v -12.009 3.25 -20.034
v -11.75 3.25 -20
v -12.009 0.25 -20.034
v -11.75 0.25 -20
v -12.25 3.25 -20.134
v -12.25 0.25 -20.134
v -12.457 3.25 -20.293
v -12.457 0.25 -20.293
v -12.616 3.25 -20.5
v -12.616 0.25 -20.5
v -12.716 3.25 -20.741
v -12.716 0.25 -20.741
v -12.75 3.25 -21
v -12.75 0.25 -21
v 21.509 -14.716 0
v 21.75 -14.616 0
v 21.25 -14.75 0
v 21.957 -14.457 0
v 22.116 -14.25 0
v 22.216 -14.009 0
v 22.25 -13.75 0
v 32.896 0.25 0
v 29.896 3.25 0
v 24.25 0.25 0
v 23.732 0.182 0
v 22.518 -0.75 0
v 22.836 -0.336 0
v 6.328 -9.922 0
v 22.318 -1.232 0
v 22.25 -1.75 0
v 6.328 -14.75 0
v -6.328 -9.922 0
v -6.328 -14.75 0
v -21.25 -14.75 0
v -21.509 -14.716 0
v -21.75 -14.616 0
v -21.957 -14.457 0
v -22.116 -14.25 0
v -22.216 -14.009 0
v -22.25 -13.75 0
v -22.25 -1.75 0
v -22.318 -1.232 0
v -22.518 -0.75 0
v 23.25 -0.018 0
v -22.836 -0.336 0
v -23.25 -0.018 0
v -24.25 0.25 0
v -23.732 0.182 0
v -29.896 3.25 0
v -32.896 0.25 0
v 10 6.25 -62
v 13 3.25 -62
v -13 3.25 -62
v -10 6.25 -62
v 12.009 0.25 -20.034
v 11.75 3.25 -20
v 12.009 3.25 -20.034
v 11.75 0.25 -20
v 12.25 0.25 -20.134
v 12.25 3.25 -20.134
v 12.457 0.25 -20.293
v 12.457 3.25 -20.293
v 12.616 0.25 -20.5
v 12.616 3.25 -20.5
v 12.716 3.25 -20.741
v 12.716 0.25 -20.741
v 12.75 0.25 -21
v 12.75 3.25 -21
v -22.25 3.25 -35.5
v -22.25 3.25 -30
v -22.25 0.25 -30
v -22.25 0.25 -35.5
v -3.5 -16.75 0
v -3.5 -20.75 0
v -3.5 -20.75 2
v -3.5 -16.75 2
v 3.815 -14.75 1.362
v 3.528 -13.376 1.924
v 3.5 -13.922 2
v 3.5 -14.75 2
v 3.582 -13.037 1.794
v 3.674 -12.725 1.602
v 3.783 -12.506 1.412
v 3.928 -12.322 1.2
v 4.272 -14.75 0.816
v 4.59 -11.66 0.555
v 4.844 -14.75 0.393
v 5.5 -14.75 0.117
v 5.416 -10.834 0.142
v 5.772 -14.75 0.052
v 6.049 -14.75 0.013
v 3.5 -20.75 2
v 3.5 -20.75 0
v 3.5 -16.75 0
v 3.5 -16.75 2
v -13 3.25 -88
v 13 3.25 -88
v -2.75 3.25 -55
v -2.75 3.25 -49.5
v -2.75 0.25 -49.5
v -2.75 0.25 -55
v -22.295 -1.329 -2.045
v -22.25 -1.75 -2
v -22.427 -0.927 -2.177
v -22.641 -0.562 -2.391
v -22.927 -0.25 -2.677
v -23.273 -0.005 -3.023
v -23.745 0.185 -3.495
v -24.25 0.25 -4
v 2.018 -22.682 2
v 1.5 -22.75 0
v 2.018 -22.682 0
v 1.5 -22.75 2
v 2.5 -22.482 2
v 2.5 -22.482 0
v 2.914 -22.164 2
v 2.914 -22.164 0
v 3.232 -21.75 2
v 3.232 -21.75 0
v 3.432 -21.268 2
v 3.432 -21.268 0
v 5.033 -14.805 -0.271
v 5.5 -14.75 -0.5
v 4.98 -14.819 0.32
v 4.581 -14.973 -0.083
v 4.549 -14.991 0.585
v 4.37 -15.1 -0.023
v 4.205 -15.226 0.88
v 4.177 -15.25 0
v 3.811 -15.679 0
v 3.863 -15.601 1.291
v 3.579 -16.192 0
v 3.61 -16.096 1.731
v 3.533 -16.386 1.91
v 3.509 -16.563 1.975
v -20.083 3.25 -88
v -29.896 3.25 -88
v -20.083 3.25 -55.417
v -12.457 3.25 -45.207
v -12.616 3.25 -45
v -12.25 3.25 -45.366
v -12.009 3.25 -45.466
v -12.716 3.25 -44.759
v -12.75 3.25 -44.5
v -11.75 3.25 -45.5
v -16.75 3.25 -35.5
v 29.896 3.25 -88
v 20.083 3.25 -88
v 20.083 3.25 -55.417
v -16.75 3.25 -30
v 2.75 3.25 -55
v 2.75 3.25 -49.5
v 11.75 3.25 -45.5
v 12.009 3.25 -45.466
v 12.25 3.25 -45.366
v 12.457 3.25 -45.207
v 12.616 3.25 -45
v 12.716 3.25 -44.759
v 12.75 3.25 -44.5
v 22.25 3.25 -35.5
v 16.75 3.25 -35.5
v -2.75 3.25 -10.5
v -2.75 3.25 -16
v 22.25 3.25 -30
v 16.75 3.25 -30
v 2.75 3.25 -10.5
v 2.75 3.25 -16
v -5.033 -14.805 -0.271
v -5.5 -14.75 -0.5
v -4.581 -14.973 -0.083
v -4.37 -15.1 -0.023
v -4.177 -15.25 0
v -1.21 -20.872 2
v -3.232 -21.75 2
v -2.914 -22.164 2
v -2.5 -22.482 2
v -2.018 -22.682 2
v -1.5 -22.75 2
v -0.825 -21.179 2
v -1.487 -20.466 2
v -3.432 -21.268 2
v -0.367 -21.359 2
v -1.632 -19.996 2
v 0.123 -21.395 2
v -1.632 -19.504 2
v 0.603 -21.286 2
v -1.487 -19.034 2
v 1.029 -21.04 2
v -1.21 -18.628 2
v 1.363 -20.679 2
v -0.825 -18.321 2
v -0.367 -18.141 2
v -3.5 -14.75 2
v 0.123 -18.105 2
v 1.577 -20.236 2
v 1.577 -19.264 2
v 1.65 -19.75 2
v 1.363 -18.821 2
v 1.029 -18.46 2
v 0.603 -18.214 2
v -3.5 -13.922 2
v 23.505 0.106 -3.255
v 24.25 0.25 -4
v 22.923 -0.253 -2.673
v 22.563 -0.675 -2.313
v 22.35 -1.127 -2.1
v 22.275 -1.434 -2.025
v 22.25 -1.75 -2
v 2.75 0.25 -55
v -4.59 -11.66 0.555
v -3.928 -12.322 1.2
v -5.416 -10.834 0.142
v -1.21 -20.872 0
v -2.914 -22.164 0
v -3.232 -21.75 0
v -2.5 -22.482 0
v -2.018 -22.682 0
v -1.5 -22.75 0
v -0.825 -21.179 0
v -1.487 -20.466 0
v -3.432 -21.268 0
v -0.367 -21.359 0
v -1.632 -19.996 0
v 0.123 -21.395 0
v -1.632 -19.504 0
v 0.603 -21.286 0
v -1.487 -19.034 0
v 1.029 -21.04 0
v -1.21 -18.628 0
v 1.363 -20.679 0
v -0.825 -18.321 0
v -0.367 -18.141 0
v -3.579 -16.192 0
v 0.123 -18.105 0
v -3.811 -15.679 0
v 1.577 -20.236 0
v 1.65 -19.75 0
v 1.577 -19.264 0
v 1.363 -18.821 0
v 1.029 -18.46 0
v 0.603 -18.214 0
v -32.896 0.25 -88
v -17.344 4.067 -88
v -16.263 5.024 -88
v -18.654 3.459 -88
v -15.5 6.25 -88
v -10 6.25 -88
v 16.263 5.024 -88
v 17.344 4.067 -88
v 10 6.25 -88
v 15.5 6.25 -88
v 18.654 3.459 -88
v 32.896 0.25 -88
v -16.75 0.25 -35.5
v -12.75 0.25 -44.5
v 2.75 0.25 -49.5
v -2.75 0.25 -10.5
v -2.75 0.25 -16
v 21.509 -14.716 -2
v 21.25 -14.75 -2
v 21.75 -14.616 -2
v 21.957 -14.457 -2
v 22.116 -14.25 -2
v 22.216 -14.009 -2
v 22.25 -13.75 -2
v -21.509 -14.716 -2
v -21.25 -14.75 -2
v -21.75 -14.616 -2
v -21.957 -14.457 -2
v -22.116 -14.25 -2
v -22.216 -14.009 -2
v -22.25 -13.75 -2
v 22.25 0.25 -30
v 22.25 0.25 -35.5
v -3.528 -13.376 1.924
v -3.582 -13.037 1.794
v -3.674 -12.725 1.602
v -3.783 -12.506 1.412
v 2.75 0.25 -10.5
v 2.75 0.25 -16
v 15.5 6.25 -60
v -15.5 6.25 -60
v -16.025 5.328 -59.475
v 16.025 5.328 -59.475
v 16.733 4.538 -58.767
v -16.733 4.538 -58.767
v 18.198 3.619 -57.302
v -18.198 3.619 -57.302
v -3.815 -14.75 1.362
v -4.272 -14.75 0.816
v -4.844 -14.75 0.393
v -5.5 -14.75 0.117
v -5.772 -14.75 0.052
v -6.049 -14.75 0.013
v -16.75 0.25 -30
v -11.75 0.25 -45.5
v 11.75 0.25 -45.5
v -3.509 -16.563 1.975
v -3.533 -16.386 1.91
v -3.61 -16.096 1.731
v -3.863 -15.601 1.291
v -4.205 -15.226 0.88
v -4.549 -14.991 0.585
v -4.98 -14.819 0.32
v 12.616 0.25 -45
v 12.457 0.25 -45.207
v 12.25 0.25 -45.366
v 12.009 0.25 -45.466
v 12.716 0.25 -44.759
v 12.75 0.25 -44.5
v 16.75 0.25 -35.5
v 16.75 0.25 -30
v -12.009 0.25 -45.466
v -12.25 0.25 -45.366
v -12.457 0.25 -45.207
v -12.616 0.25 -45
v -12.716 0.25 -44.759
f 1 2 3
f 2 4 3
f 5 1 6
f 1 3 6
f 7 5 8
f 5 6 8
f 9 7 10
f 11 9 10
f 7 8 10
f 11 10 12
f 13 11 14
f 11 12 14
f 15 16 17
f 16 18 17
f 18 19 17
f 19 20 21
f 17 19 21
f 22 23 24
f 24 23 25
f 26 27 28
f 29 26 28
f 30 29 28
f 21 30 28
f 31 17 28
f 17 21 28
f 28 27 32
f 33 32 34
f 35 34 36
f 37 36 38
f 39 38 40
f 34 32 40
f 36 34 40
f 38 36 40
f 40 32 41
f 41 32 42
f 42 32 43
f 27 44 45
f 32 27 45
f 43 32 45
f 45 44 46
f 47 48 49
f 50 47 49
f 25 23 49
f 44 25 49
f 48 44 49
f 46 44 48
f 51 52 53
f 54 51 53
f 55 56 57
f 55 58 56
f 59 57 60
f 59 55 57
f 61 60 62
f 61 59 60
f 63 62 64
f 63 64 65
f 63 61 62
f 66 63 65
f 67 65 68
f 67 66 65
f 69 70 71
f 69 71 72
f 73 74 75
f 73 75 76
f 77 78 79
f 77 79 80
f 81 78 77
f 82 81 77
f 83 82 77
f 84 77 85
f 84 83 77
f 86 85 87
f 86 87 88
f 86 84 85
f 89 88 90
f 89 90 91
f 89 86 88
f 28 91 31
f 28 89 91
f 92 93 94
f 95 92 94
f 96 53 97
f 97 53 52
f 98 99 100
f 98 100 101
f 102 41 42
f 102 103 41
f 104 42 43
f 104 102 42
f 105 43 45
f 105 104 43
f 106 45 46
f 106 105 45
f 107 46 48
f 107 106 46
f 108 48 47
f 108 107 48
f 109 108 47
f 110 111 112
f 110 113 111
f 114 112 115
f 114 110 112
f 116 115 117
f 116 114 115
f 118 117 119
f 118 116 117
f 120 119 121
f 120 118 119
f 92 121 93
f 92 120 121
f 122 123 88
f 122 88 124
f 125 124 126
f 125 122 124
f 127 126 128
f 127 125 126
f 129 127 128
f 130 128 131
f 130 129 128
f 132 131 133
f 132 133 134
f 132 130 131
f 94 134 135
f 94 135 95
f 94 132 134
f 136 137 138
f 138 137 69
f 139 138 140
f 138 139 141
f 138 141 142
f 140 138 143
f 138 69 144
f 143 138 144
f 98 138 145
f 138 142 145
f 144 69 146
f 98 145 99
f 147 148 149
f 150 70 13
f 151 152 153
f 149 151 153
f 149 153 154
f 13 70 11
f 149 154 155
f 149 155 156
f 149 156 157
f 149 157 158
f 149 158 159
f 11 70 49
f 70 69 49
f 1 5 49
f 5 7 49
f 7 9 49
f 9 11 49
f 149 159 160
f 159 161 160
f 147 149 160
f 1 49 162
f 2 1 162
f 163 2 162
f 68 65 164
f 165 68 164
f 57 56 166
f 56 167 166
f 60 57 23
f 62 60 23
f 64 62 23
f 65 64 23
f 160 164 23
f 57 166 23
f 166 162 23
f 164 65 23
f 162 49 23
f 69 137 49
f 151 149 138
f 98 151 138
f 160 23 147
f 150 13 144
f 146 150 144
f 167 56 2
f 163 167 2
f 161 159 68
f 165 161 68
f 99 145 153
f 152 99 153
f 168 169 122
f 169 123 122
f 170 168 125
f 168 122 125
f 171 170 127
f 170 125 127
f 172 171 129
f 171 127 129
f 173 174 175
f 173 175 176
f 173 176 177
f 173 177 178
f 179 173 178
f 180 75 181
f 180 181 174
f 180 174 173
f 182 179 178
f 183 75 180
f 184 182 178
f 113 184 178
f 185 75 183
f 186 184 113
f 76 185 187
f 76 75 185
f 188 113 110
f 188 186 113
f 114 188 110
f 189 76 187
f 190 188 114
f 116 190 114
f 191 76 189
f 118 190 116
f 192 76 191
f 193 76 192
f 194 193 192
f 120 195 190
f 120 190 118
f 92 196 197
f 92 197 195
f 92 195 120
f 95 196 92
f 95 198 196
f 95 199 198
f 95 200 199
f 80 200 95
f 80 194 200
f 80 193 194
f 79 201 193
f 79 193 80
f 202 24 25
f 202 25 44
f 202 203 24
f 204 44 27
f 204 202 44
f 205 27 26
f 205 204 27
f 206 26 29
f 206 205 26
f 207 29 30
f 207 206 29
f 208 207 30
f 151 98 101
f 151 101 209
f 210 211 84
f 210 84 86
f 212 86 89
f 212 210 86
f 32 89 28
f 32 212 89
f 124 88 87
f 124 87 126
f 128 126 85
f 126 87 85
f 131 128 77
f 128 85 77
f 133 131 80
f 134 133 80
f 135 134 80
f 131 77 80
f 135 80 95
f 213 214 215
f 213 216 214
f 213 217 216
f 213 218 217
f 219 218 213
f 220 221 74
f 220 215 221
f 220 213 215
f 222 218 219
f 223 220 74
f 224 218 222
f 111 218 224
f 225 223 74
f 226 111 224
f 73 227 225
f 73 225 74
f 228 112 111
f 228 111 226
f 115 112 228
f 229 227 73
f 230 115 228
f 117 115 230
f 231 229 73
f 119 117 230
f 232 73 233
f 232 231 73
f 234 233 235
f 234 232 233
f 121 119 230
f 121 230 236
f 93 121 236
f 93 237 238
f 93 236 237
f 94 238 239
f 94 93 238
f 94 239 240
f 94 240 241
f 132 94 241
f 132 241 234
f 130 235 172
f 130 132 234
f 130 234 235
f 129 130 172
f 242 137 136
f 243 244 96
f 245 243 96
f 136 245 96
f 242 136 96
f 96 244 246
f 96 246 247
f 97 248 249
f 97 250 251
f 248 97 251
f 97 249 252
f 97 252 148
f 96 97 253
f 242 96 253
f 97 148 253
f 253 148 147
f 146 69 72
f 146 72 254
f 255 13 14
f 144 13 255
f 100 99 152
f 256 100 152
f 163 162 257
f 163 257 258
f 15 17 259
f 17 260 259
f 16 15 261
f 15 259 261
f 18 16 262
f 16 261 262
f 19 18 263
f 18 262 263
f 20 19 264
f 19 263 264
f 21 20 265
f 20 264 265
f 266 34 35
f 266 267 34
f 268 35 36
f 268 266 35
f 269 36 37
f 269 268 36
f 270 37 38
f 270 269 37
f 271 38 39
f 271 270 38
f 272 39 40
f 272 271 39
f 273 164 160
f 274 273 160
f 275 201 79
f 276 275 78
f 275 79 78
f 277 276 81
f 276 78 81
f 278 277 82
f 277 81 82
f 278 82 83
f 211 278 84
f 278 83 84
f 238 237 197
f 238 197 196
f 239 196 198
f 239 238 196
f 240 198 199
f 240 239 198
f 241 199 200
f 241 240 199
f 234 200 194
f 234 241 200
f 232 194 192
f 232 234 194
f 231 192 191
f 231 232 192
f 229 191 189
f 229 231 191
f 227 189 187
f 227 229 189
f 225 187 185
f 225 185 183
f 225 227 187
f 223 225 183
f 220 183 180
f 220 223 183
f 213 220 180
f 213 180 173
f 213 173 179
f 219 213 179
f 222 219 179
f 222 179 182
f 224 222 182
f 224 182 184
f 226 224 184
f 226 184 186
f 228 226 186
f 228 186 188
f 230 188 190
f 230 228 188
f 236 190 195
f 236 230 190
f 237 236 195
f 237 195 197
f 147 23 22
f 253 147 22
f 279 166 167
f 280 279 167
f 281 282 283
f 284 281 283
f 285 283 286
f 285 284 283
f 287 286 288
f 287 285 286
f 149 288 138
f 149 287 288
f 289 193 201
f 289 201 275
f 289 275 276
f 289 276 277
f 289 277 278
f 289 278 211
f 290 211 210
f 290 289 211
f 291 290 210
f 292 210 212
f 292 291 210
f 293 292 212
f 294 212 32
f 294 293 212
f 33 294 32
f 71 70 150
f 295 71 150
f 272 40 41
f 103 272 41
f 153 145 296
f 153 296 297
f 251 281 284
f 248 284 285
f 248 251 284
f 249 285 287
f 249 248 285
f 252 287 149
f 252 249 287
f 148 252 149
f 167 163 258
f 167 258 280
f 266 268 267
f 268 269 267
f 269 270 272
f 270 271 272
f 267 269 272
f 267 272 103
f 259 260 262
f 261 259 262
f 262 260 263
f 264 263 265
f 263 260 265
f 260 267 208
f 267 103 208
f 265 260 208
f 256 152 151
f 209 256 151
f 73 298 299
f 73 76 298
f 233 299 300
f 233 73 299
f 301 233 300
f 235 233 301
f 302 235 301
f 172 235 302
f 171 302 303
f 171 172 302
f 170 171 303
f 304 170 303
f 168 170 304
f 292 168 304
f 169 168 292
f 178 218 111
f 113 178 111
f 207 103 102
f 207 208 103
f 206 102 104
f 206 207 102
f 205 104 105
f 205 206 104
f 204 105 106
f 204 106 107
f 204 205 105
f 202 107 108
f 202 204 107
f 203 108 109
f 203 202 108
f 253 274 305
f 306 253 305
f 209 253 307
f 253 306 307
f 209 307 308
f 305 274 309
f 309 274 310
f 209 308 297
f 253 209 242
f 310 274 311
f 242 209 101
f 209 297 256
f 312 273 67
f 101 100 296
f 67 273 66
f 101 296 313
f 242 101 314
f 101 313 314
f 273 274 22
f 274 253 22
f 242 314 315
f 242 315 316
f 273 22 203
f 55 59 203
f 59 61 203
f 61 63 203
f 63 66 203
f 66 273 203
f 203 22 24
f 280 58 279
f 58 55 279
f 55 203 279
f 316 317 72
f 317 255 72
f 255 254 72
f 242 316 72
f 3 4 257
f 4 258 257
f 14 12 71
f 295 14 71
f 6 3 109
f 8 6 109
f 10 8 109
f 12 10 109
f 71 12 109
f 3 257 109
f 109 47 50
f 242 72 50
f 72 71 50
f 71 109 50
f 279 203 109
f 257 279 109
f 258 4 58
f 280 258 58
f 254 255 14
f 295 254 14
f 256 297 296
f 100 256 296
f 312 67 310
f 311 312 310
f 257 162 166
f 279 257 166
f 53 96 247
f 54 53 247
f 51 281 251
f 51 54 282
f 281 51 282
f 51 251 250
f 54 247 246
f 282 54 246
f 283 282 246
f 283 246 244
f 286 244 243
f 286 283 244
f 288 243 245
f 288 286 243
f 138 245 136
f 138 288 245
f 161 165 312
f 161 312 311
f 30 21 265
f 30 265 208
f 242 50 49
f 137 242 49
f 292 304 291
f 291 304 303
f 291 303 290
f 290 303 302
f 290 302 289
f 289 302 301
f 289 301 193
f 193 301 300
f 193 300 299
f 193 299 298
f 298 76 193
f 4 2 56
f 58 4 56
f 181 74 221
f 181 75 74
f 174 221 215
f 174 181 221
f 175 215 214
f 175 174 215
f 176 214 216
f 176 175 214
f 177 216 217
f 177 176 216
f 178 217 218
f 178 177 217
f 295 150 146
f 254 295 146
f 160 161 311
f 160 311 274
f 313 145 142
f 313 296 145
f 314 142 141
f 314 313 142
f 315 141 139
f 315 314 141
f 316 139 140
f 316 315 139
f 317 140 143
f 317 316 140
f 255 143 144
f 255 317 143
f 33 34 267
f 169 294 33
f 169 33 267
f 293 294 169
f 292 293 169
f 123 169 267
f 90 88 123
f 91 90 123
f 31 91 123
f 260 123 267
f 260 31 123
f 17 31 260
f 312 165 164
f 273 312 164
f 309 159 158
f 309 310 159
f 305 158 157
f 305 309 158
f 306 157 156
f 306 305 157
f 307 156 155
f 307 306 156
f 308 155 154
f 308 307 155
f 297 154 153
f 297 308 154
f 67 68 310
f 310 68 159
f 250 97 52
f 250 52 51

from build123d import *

# Parameters (mm, degrees)
BOSS_EXTRUDE1_DEPTH = 88
SKETCH2_W           = 44.5
SKETCH2_H           = 15
BOSS_EXTRUDE2_DEPTH = 2
SKETCH3_W           = 7
SKETCH3_H           = 10
SKETCH3_R           = 1.65
BOSS_EXTRUDE3_DEPTH = 2
FILLET1_R           = 3
FILLET2_R           = 2
FILLET3_R           = 2
FILLET4_R           = 2
FILLET5_R           = 0.5
FILLET6_R           = 1
FILLET7_R           = 2
SKETCH4_W           = 25.5
SKETCH4_H           = 25.5
SKETCH4_W_2         = 5.5
SKETCH4_H_2         = 5.5
CUT_EXTRUDE1_DEPTH  = 3
FILLET8_R           = 1
BOSS_EXTRUDE4_DEPTH = 28
BOSS_EXTRUDE5_REACH = 104.975
SKETCH7_W           = 2
SKETCH7_H           = 3
FILLET9_R           = 5


with BuildPart() as part:
    # Sketch1 → Boss-Extrude1 (new body)
    with BuildSketch(Plane.XY):
        Polygon((29.896446609, 3.25), (32.896446609, 0.25), (-32.896446609, 0.25), (-29.896446609, 3.25), align=None)
    extrude(amount=-BOSS_EXTRUDE1_DEPTH)

    # Sketch2 → Boss-Extrude2 (add)
    with BuildSketch(Plane.XY):
        with Locations((0, -7.25)):
            Rectangle(SKETCH2_W, SKETCH2_H)
    extrude(amount=-BOSS_EXTRUDE2_DEPTH)

    # Sketch3 → Boss-Extrude3 (add)
    with BuildSketch(Plane.XY):
        with Locations((0, -17.75)):
            Rectangle(SKETCH3_W, SKETCH3_H)
        with Locations((0, -19.75)):
            Circle(SKETCH3_R, mode=Mode.SUBTRACT)
    extrude(amount=BOSS_EXTRUDE3_DEPTH)

    # Fillet1
    # the kernel refuses this fillet: 3 mm, written as the material it adds along each edge
    with BuildSketch(Plane(origin=(3.5, -12.75, 0), x_dir=(1, 0, 0), z_dir=(0, -1, 0))) as fillet1_piece_1_section:
        with BuildLine():
            CenterArc((2.828427125, 3), FILLET1_R, 199.471220634, 70.528779366)
            Line((0, 2), (-0.056568542, 1.98))
            ThreePointArc((-0.056568542, 1.98), (-0.06, 1), (-0.06, 0))
            Line((-0.06, 0), (0, -0.06))
            Line((0, -0.06), (2.828427125, -0.06))
            Line((2.828427125, -0.06), (2.828427125, 0))
        make_face()
    fillet1_piece_1 = extrude(amount=2, mode=Mode.PRIVATE)
    fillet1_piece_1 = split(fillet1_piece_1, bisect_by=Plane(origin=(4.103392335, -13.75, 0), z_dir=(0, 0, 1)), keep=Keep.TOP, mode=Mode.PRIVATE)
    add(fillet1_piece_1)
    with BuildSketch(Plane(origin=(-3.5, -14.75, 0), x_dir=(-1, 0, 0), z_dir=(0, 1, 0))) as fillet1_piece_2_section:
        with BuildLine():
            CenterArc((2.828427125, 3), FILLET1_R, 199.471220634, 70.528779366)
            Line((0, 2), (-0.056568542, 1.98))
            ThreePointArc((-0.056568542, 1.98), (-0.06, 1), (-0.06, 0))
            Line((-0.06, 0), (0, -0.06))
            Line((0, -0.06), (2.828427125, -0.06))
            Line((2.828427125, -0.06), (2.828427125, 0))
        make_face()
    fillet1_piece_2 = extrude(amount=2, mode=Mode.PRIVATE)
    fillet1_piece_2 = split(fillet1_piece_2, bisect_by=Plane(origin=(-4.103392335, -13.75, 0), z_dir=(0, 0, 1)), keep=Keep.TOP, mode=Mode.PRIVATE)
    add(fillet1_piece_2)
    with BuildSketch(Plane(origin=(-3.5, -12.75, 0), x_dir=(0, 1, 0), z_dir=(1, 0, 0))) as fillet1_piece_3:
        with BuildLine():
            CenterArc((2.828427125, 3), FILLET1_R, 199.471220634, 70.528779366)
            Line((0, 2), (-0.056568542, 1.98))
            ThreePointArc((-0.056568542, 1.98), (-0.06, 1), (-0.06, 0))
            Line((-0.06, 0), (0, -0.06))
            Line((0, -0.06), (2.828427125, -0.06))
            Line((2.828427125, -0.06), (2.828427125, 0))
        make_face()
    extrude(amount=7)
    with BuildSketch(Plane(origin=(-3.5, -12.75, 0), x_dir=(0, 1, 0), z_dir=(1, 0, 0))) as fillet1_piece_4a_section:
        with BuildLine():
            CenterArc((2.828427125, 3), FILLET1_R, 199.471220634, 70.528779366)
            Line((0, 2), (-0.056568542, 1.98))
            ThreePointArc((-0.056568542, 1.98), (-0.06, 1), (-0.06, 0))
            Line((-0.06, 0), (0, -0.06))
            Line((0, -0.06), (2.828427125, -0.06))
            Line((2.828427125, -0.06), (2.828427125, 0))
        make_face()
    fillet1_piece_4a = extrude(amount=14.071067812, mode=Mode.PRIVATE)
    fillet1_piece_4a = split(fillet1_piece_4a, bisect_by=Plane(origin=(3.5, -12.071681569, 0.51353179), z_dir=(1, 0, 0)), keep=Keep.TOP, mode=Mode.PRIVATE)
    with BuildSketch(Plane(origin=(3.5, -5.678932188, 0), x_dir=(1, 0, 0), z_dir=(0, -1, 0))) as fillet1_piece_4b_section:
        with BuildLine():
            CenterArc((2.828427125, 3), FILLET1_R, 199.471220634, 70.528779366)
            Line((0, 2), (-0.056568542, 1.98))
            ThreePointArc((-0.056568542, 1.98), (-0.06, 1), (-0.06, 0))
            Line((-0.06, 0), (0, -0.06))
            Line((0, -0.06), (2.828427125, -0.06))
            Line((2.828427125, -0.06), (2.828427125, 0))
        make_face()
    fillet1_piece_4b = extrude(amount=9.071067812, mode=Mode.PRIVATE)
    fillet1_piece_4b = split(fillet1_piece_4b, bisect_by=Plane(origin=(4.103392335, -12.75, 0.570016865), z_dir=(0, 1, 0)), keep=Keep.TOP, mode=Mode.PRIVATE)
    fillet1_piece_4b = split(fillet1_piece_4b, bisect_by=Plane(origin=(4.103392335, -9.214466094, 0), z_dir=(0, 0, 1)), keep=Keep.TOP, mode=Mode.PRIVATE)
    fillet1_piece_4 = fillet1_piece_4a & fillet1_piece_4b
    add(fillet1_piece_4)
    with BuildSketch(Plane(origin=(-3.5, -12.75, 0), x_dir=(0, 1, 0), z_dir=(1, 0, 0))) as fillet1_piece_5a_section:
        with BuildLine():
            CenterArc((2.828427125, 3), FILLET1_R, 199.471220634, 70.528779366)
            Line((0, 2), (-0.056568542, 1.98))
            ThreePointArc((-0.056568542, 1.98), (-0.06, 1), (-0.06, 0))
            Line((-0.06, 0), (0, -0.06))
            Line((0, -0.06), (2.828427125, -0.06))
            Line((2.828427125, -0.06), (2.828427125, 0))
        make_face()
    fillet1_piece_5a = extrude(amount=14.071067812, mode=Mode.PRIVATE)
    fillet1_piece_5a = split(fillet1_piece_5a, bisect_by=Plane(origin=(3.5, -12.071681569, 0.51353179), z_dir=(1, 0, 0)), keep=Keep.TOP, mode=Mode.PRIVATE)
    with BuildSketch(Plane(origin=(3.5, -5.678932188, 0), x_dir=(1, 0, 0), z_dir=(0, -1, 0))) as fillet1_piece_5b_section:
        with BuildLine():
            CenterArc((2.828427125, 3), FILLET1_R, 199.471220634, 70.528779366)
            Line((0, 2), (-0.056568542, 1.98))
            ThreePointArc((-0.056568542, 1.98), (-0.06, 1), (-0.06, 0))
            Line((-0.06, 0), (0, -0.06))
            Line((0, -0.06), (2.828427125, -0.06))
            Line((2.828427125, -0.06), (2.828427125, 0))
        make_face()
    fillet1_piece_5b = extrude(amount=9.071067812, mode=Mode.PRIVATE)
    fillet1_piece_5b = split(fillet1_piece_5b, bisect_by=Plane(origin=(4.899161086, -12.75, -0.029895047), z_dir=(0, 1, 0)), keep=Keep.TOP, mode=Mode.PRIVATE)
    fillet1_piece_5b = split(fillet1_piece_5b, bisect_by=Plane(origin=(4.899161086, -9.214466094, 0), z_dir=(0, 0, -1)), keep=Keep.TOP, mode=Mode.PRIVATE)
    fillet1_piece_5 = fillet1_piece_5a & fillet1_piece_5b
    add(fillet1_piece_5)
    with BuildSketch(Plane(origin=(-3.5, -12.75, 0), x_dir=(0, 1, 0), z_dir=(1, 0, 0))) as fillet1_piece_6a_section:
        with BuildLine():
            CenterArc((2.828427125, 3), FILLET1_R, 199.471220634, 70.528779366)
            Line((0, 2), (-0.056568542, 1.98))
            ThreePointArc((-0.056568542, 1.98), (-0.06, 1), (-0.06, 0))
            Line((-0.06, 0), (0, -0.06))
            Line((0, -0.06), (2.828427125, -0.06))
            Line((2.828427125, -0.06), (2.828427125, 0))
        make_face()
    fillet1_piece_6a = extrude(amount=14.071067812, mode=Mode.PRIVATE)
    fillet1_piece_6a = split(fillet1_piece_6a, bisect_by=Plane(origin=(3.5, -12.071681569, 0.51353179), z_dir=(1, 0, 0)), keep=Keep.TOP, mode=Mode.PRIVATE)
    with BuildSketch(Plane(origin=(3.5, -12.75, 0), x_dir=(1, 0, 0), z_dir=(0, -1, 0))) as fillet1_piece_6b_section:
        with BuildLine():
            CenterArc((2.828427125, 3), FILLET1_R, 199.471220634, 70.528779366)
            Line((0, 2), (-0.056568542, 1.98))
            ThreePointArc((-0.056568542, 1.98), (-0.06, 1), (-0.06, 0))
            Line((-0.06, 0), (0, -0.06))
            Line((0, -0.06), (2.828427125, -0.06))
            Line((2.828427125, -0.06), (2.828427125, 0))
        make_face()
    fillet1_piece_6b = extrude(amount=2, mode=Mode.PRIVATE)
    fillet1_piece_6b = split(fillet1_piece_6b, bisect_by=Plane(origin=(4.899161086, -13.75, 0), z_dir=(0, 0, -1)), keep=Keep.TOP, mode=Mode.PRIVATE)
    fillet1_piece_6 = fillet1_piece_6a & fillet1_piece_6b
    add(fillet1_piece_6)
    with BuildSketch(Plane(origin=(-3.5, -14.75, 0), x_dir=(-1, 0, 0), z_dir=(0, 1, 0))) as fillet1_piece_7a_section:
        with BuildLine():
            CenterArc((2.828427125, 3), FILLET1_R, 199.471220634, 70.528779366)
            Line((0, 2), (-0.056568542, 1.98))
            ThreePointArc((-0.056568542, 1.98), (-0.06, 1), (-0.06, 0))
            Line((-0.06, 0), (0, -0.06))
            Line((0, -0.06), (2.828427125, -0.06))
            Line((2.828427125, -0.06), (2.828427125, 0))
        make_face()
    fillet1_piece_7a = extrude(amount=9.071067812, mode=Mode.PRIVATE)
    fillet1_piece_7a = split(fillet1_piece_7a, bisect_by=Plane(origin=(-4.103392335, -12.75, 0.570016865), z_dir=(0, 1, 0)), keep=Keep.TOP, mode=Mode.PRIVATE)
    fillet1_piece_7a = split(fillet1_piece_7a, bisect_by=Plane(origin=(-4.103392335, -9.214466094, 0), z_dir=(0, 0, 1)), keep=Keep.TOP, mode=Mode.PRIVATE)
    with BuildSketch(Plane(origin=(-10.571067812, -12.75, 0), x_dir=(0, 1, 0), z_dir=(1, 0, 0))) as fillet1_piece_7b_section:
        with BuildLine():
            CenterArc((2.828427125, 3), FILLET1_R, 199.471220634, 70.528779366)
            Line((0, 2), (-0.056568542, 1.98))
            ThreePointArc((-0.056568542, 1.98), (-0.06, 1), (-0.06, 0))
            Line((-0.06, 0), (0, -0.06))
            Line((0, -0.06), (2.828427125, -0.06))
            Line((2.828427125, -0.06), (2.828427125, 0))
        make_face()
    fillet1_piece_7b = extrude(amount=14.071067812, mode=Mode.PRIVATE)
    fillet1_piece_7b = split(fillet1_piece_7b, bisect_by=Plane(origin=(-3.5, -12.071681569, 0.51353179), z_dir=(-1, 0, 0)), keep=Keep.TOP, mode=Mode.PRIVATE)
    fillet1_piece_7 = fillet1_piece_7a & fillet1_piece_7b
    add(fillet1_piece_7)
    with BuildSketch(Plane(origin=(-3.5, -14.75, 0), x_dir=(-1, 0, 0), z_dir=(0, 1, 0))) as fillet1_piece_8a_section:
        with BuildLine():
            CenterArc((2.828427125, 3), FILLET1_R, 199.471220634, 70.528779366)
            Line((0, 2), (-0.056568542, 1.98))
            ThreePointArc((-0.056568542, 1.98), (-0.06, 1), (-0.06, 0))
            Line((-0.06, 0), (0, -0.06))
            Line((0, -0.06), (2.828427125, -0.06))
            Line((2.828427125, -0.06), (2.828427125, 0))
        make_face()
    fillet1_piece_8a = extrude(amount=2, mode=Mode.PRIVATE)
    fillet1_piece_8a = split(fillet1_piece_8a, bisect_by=Plane(origin=(-4.899161086, -13.75, 0), z_dir=(0, 0, -1)), keep=Keep.TOP, mode=Mode.PRIVATE)
    with BuildSketch(Plane(origin=(-10.571067812, -12.75, 0), x_dir=(0, 1, 0), z_dir=(1, 0, 0))) as fillet1_piece_8b_section:
        with BuildLine():
            CenterArc((2.828427125, 3), FILLET1_R, 199.471220634, 70.528779366)
            Line((0, 2), (-0.056568542, 1.98))
            ThreePointArc((-0.056568542, 1.98), (-0.06, 1), (-0.06, 0))
            Line((-0.06, 0), (0, -0.06))
            Line((0, -0.06), (2.828427125, -0.06))
            Line((2.828427125, -0.06), (2.828427125, 0))
        make_face()
    fillet1_piece_8b = extrude(amount=14.071067812, mode=Mode.PRIVATE)
    fillet1_piece_8b = split(fillet1_piece_8b, bisect_by=Plane(origin=(-3.5, -12.071681569, 0.51353179), z_dir=(-1, 0, 0)), keep=Keep.TOP, mode=Mode.PRIVATE)
    fillet1_piece_8 = fillet1_piece_8a & fillet1_piece_8b
    add(fillet1_piece_8)
    with BuildSketch(Plane(origin=(-3.5, -14.75, 0), x_dir=(-1, 0, 0), z_dir=(0, 1, 0))) as fillet1_piece_9a_section:
        with BuildLine():
            CenterArc((2.828427125, 3), FILLET1_R, 199.471220634, 70.528779366)
            Line((0, 2), (-0.056568542, 1.98))
            ThreePointArc((-0.056568542, 1.98), (-0.06, 1), (-0.06, 0))
            Line((-0.06, 0), (0, -0.06))
            Line((0, -0.06), (2.828427125, -0.06))
            Line((2.828427125, -0.06), (2.828427125, 0))
        make_face()
    fillet1_piece_9a = extrude(amount=9.071067812, mode=Mode.PRIVATE)
    fillet1_piece_9a = split(fillet1_piece_9a, bisect_by=Plane(origin=(-4.899161086, -12.75, -0.029895047), z_dir=(0, 1, 0)), keep=Keep.TOP, mode=Mode.PRIVATE)
    fillet1_piece_9a = split(fillet1_piece_9a, bisect_by=Plane(origin=(-4.899161086, -9.214466094, 0), z_dir=(0, 0, -1)), keep=Keep.TOP, mode=Mode.PRIVATE)
    with BuildSketch(Plane(origin=(-10.571067812, -12.75, 0), x_dir=(0, 1, 0), z_dir=(1, 0, 0))) as fillet1_piece_9b_section:
        with BuildLine():
            CenterArc((2.828427125, 3), FILLET1_R, 199.471220634, 70.528779366)
            Line((0, 2), (-0.056568542, 1.98))
            ThreePointArc((-0.056568542, 1.98), (-0.06, 1), (-0.06, 0))
            Line((-0.06, 0), (0, -0.06))
            Line((0, -0.06), (2.828427125, -0.06))
            Line((2.828427125, -0.06), (2.828427125, 0))
        make_face()
    fillet1_piece_9b = extrude(amount=14.071067812, mode=Mode.PRIVATE)
    fillet1_piece_9b = split(fillet1_piece_9b, bisect_by=Plane(origin=(-3.5, -12.071681569, 0.51353179), z_dir=(-1, 0, 0)), keep=Keep.TOP, mode=Mode.PRIVATE)
    fillet1_piece_9 = fillet1_piece_9a & fillet1_piece_9b
    add(fillet1_piece_9)

    # Fillet2
    # the kernel refuses this fillet: 2 mm, written as the material it adds along each edge
    with BuildSketch(Plane(origin=(3.5, -14.75, 0), x_dir=(0, -1, 0), z_dir=(0, 0, 1))) as fillet2_piece_1_section:
        with BuildLine():
            CenterArc((FILLET2_R, FILLET2_R), FILLET2_R, 180, 90)
            Line((0, FILLET2_R), (0, 0))
            Line((0, 0), (FILLET2_R, 0))
        make_face()
    fillet2_piece_1 = extrude(amount=2, mode=Mode.PRIVATE)
    fillet2_piece_1 = fillet2_piece_1 - Plane(origin=(6.328427125, -15.280348572, 3), x_dir=(1, 0, 0), z_dir=(0, 1, 0)) * Cylinder(3, 12, mode=Mode.PRIVATE)
    add(fillet2_piece_1)
    with BuildSketch(Plane(origin=(-3.5, -14.75, 0), x_dir=(0, -1, 0), z_dir=(0, 0, 1))) as fillet2_piece_2_section:
        with BuildLine():
            CenterArc((FILLET2_R, -FILLET2_R), FILLET2_R, 90, 90)
            Line((0, -FILLET2_R), (0, 0))
            Line((0, 0), (FILLET2_R, 0))
        make_face()
    fillet2_piece_2 = extrude(amount=2, mode=Mode.PRIVATE)
    fillet2_piece_2 = fillet2_piece_2 - Plane(origin=(-6.328427125, -15.280348572, 3), x_dir=(-1, 0, 0), z_dir=(0, -1, 0)) * Cylinder(3, 12, mode=Mode.PRIVATE)
    add(fillet2_piece_2)

    # Fillet3
    fillet3_edges = [part.edges().sort_by_distance(p)[0] for p in [
        (-3.5, -22.75, 1),
        (3.5, -22.75, 1),
    ]]
    fillet(fillet3_edges, radius=FILLET3_R)

    # Fillet4
    fillet4_edges = [part.edges().sort_by_distance(p)[0] for p in [
        (0, -12.75, 2),
    ]]
    fillet(fillet4_edges, radius=FILLET4_R)

    # Fillet5
    fillet5_edges = [part.edges().sort_by_distance(p)[0] for p in [
        (0, -14.75, 0),
    ]]
    fillet(fillet5_edges, radius=FILLET5_R)

    # Fillet6
    fillet6_edges = [part.edges().sort_by_distance(p)[0] for p in [
        (22.25, -14.75, -1),
        (-22.25, -14.75, -1),
    ]]
    fillet(fillet6_edges, radius=FILLET6_R)

    # Fillet7
    fillet7_edges = [part.edges().sort_by_distance(p)[0] for p in [
        (22.25, 0.25, -1),
        (0, 0.25, -2),
        (-22.25, 0.25, -1),
    ]]
    fillet(fillet7_edges, radius=FILLET7_R)

    # Sketch4 → Cut-Extrude1 (cut)
    with BuildSketch(Plane(origin=(0, 3.25, 0), x_dir=(1, 0, 0), z_dir=(0, 1, 0))):
        with Locations((0, 32.75)):
            Rectangle(SKETCH4_W, SKETCH4_H)
        with Locations((0, 13.25)):
            Rectangle(SKETCH4_W_2, SKETCH4_H_2)
        with Locations((19.5, 32.75)):
            Rectangle(SKETCH4_W_2, SKETCH4_H_2)
        with Locations((-19.5, 32.75)):
            Rectangle(SKETCH4_W_2, SKETCH4_H_2)
        with Locations((0, 52.25)):
            Rectangle(SKETCH4_W_2, SKETCH4_H_2)
    extrude(amount=-CUT_EXTRUDE1_DEPTH, mode=Mode.SUBTRACT)

    # Fillet8
    fillet8_edges = [part.edges().sort_by_distance(p)[0] for p in [
        (12.75, 1.75, -20),
        (12.75, 1.75, -45.5),
        (-12.75, 1.75, -45.5),
        (-12.75, 1.75, -20),
    ]]
    fillet(fillet8_edges, radius=FILLET8_R)

    # Sketch6 → Boss-Extrude4 (add)
    with BuildSketch(Plane(origin=(0, 0, -88), x_dir=(-1, 0, 0), z_dir=(0, 0, -1))):
        Polygon((-13, 3.25), (-10, 6.25), (-15.5, 6.25), (-15.5, 3.25), align=None)
        Polygon((15.5, 6.25), (15.5, 3.25), (13, 3.25), (10, 6.25), align=None)
    extrude(amount=-BOSS_EXTRUDE4_DEPTH)

    # Boss-Extrude5: up to this plane
    boss_extrude5_end = Plane(origin=(13, 3.25, -60), z_dir=(-0.7071067811865439, -0.7071067811865512, 0))
    # Sketch7 → Boss-Extrude5 (add, up to the surface)
    with BuildSketch(Plane.ZY.offset(15.5), mode=Mode.PRIVATE) as boss_extrude5_sk1:
        with Locations((-61, 4.75)):
            Rectangle(SKETCH7_W, SKETCH7_H)
    boss_extrude5_tool1 = split(extrude(boss_extrude5_sk1.sketch, amount=-BOSS_EXTRUDE5_REACH, mode=Mode.PRIVATE), bisect_by=boss_extrude5_end, keep=Keep.BOTH, mode=Mode.PRIVATE)
    add(boss_extrude5_tool1.solids().sort_by_distance((-15.5, 4.75, -61))[0])

    # Fillet9
    # the kernel refuses this fillet: 5 mm, written as the material it adds along each edge
    with BuildSketch(Plane(origin=(15.5, 3.25, -60), x_dir=(0, 0, 1), z_dir=(-1, 0, 0))) as fillet9_piece_1:
        with BuildLine():
            CenterArc((4.582575695, 5), FILLET9_R, 203.578178478, 66.421821522)
            Line((0, 3), (-0.091651514, 2.96))
            ThreePointArc((-0.091651514, 2.96), (-0.1, 1.5), (-0.1, 0))
            Line((-0.1, 0), (0, -0.1))
            Line((0, -0.1), (4.582575695, -0.1))
            Line((4.582575695, -0.1), (4.582575695, 0))
        make_face()
    extrude(amount=31)
    with BuildSketch(Plane(origin=(-15.5, 3.25, -60), x_dir=(-1, 0, 0), z_dir=(0, 0, -1)), Plane(origin=(15.5, 3.25, -88), x_dir=(1, 0, 0), z_dir=(0, 0, 1))) as fillet9_piece_2:
        with BuildLine():
            CenterArc((4.582575695, 5), FILLET9_R, 203.578178478, 66.421821522)
            Line((0, 3), (-0.091651514, 2.96))
            ThreePointArc((-0.091651514, 2.96), (-0.1, 1.5), (-0.1, 0))
            Line((-0.1, 0), (0, -0.1))
            Line((0, -0.1), (4.582575695, -0.1))
            Line((4.582575695, -0.1), (4.582575695, 0))
        make_face()
    extrude(amount=28)
    with BuildSketch(Plane(origin=(26.956439237, 3.25, -60), x_dir=(0, 0, 1), z_dir=(-1, 0, 0))) as fillet9_piece_3a_section:
        with BuildLine():
            CenterArc((4.582575695, 5), FILLET9_R, 203.578178478, 66.421821522)
            Line((0, 3), (-0.091651514, 2.96))
            ThreePointArc((-0.091651514, 2.96), (-0.1, 1.5), (-0.1, 0))
            Line((-0.1, 0), (0, -0.1))
            Line((0, -0.1), (4.582575695, -0.1))
            Line((4.582575695, -0.1), (4.582575695, 0))
        make_face()
    fillet9_piece_3a = extrude(amount=42.456439237, mode=Mode.PRIVATE)
    fillet9_piece_3a = split(fillet9_piece_3a, bisect_by=Plane(origin=(15.5, 4.025816439, -58.884062279), z_dir=(1, 0, 0)), keep=Keep.TOP, mode=Mode.PRIVATE)
    with BuildSketch(Plane(origin=(15.5, 3.25, -88), x_dir=(1, 0, 0), z_dir=(0, 0, 1))) as fillet9_piece_3b_section:
        with BuildLine():
            CenterArc((4.582575695, 5), FILLET9_R, 203.578178478, 66.421821522)
            Line((0, 3), (-0.091651514, 2.96))
            ThreePointArc((-0.091651514, 2.96), (-0.1, 1.5), (-0.1, 0))
            Line((-0.1, 0), (0, -0.1))
            Line((0, -0.1), (4.582575695, -0.1))
            Line((4.582575695, -0.1), (4.582575695, 0))
        make_face()
    fillet9_piece_3b = extrude(amount=39.456439237, mode=Mode.PRIVATE)
    fillet9_piece_3b = split(fillet9_piece_3b, bisect_by=Plane(origin=(16.615937721, 4.025816439, -60), z_dir=(0, 0, 1)), keep=Keep.TOP, mode=Mode.PRIVATE)
    fillet9_piece_3 = fillet9_piece_3a & fillet9_piece_3b
    add(fillet9_piece_3)
    with BuildSketch(Plane(origin=(-15.5, 3.25, -48.543560763), x_dir=(-1, 0, 0), z_dir=(0, 0, -1))) as fillet9_piece_4a_section:
        with BuildLine():
            CenterArc((4.582575695, 5), FILLET9_R, 203.578178478, 66.421821522)
            Line((0, 3), (-0.091651514, 2.96))
            ThreePointArc((-0.091651514, 2.96), (-0.1, 1.5), (-0.1, 0))
            Line((-0.1, 0), (0, -0.1))
            Line((0, -0.1), (4.582575695, -0.1))
            Line((4.582575695, -0.1), (4.582575695, 0))
        make_face()
    fillet9_piece_4a = extrude(amount=39.456439237, mode=Mode.PRIVATE)
    fillet9_piece_4a = split(fillet9_piece_4a, bisect_by=Plane(origin=(-16.615937721, 4.025816439, -60), z_dir=(0, 0, 1)), keep=Keep.TOP, mode=Mode.PRIVATE)
    with BuildSketch(Plane(origin=(15.5, 3.25, -60), x_dir=(0, 0, 1), z_dir=(-1, 0, 0))) as fillet9_piece_4b_section:
        with BuildLine():
            CenterArc((4.582575695, 5), FILLET9_R, 203.578178478, 66.421821522)
            Line((0, 3), (-0.091651514, 2.96))
            ThreePointArc((-0.091651514, 2.96), (-0.1, 1.5), (-0.1, 0))
            Line((-0.1, 0), (0, -0.1))
            Line((0, -0.1), (4.582575695, -0.1))
            Line((4.582575695, -0.1), (4.582575695, 0))
        make_face()
    fillet9_piece_4b = extrude(amount=42.456439237, mode=Mode.PRIVATE)
    fillet9_piece_4b = split(fillet9_piece_4b, bisect_by=Plane(origin=(-15.5, 4.025816439, -58.884062279), z_dir=(-1, 0, 0)), keep=Keep.TOP, mode=Mode.PRIVATE)
    fillet9_piece_4 = fillet9_piece_4a & fillet9_piece_4b
    add(fillet9_piece_4)


solid = part.part
